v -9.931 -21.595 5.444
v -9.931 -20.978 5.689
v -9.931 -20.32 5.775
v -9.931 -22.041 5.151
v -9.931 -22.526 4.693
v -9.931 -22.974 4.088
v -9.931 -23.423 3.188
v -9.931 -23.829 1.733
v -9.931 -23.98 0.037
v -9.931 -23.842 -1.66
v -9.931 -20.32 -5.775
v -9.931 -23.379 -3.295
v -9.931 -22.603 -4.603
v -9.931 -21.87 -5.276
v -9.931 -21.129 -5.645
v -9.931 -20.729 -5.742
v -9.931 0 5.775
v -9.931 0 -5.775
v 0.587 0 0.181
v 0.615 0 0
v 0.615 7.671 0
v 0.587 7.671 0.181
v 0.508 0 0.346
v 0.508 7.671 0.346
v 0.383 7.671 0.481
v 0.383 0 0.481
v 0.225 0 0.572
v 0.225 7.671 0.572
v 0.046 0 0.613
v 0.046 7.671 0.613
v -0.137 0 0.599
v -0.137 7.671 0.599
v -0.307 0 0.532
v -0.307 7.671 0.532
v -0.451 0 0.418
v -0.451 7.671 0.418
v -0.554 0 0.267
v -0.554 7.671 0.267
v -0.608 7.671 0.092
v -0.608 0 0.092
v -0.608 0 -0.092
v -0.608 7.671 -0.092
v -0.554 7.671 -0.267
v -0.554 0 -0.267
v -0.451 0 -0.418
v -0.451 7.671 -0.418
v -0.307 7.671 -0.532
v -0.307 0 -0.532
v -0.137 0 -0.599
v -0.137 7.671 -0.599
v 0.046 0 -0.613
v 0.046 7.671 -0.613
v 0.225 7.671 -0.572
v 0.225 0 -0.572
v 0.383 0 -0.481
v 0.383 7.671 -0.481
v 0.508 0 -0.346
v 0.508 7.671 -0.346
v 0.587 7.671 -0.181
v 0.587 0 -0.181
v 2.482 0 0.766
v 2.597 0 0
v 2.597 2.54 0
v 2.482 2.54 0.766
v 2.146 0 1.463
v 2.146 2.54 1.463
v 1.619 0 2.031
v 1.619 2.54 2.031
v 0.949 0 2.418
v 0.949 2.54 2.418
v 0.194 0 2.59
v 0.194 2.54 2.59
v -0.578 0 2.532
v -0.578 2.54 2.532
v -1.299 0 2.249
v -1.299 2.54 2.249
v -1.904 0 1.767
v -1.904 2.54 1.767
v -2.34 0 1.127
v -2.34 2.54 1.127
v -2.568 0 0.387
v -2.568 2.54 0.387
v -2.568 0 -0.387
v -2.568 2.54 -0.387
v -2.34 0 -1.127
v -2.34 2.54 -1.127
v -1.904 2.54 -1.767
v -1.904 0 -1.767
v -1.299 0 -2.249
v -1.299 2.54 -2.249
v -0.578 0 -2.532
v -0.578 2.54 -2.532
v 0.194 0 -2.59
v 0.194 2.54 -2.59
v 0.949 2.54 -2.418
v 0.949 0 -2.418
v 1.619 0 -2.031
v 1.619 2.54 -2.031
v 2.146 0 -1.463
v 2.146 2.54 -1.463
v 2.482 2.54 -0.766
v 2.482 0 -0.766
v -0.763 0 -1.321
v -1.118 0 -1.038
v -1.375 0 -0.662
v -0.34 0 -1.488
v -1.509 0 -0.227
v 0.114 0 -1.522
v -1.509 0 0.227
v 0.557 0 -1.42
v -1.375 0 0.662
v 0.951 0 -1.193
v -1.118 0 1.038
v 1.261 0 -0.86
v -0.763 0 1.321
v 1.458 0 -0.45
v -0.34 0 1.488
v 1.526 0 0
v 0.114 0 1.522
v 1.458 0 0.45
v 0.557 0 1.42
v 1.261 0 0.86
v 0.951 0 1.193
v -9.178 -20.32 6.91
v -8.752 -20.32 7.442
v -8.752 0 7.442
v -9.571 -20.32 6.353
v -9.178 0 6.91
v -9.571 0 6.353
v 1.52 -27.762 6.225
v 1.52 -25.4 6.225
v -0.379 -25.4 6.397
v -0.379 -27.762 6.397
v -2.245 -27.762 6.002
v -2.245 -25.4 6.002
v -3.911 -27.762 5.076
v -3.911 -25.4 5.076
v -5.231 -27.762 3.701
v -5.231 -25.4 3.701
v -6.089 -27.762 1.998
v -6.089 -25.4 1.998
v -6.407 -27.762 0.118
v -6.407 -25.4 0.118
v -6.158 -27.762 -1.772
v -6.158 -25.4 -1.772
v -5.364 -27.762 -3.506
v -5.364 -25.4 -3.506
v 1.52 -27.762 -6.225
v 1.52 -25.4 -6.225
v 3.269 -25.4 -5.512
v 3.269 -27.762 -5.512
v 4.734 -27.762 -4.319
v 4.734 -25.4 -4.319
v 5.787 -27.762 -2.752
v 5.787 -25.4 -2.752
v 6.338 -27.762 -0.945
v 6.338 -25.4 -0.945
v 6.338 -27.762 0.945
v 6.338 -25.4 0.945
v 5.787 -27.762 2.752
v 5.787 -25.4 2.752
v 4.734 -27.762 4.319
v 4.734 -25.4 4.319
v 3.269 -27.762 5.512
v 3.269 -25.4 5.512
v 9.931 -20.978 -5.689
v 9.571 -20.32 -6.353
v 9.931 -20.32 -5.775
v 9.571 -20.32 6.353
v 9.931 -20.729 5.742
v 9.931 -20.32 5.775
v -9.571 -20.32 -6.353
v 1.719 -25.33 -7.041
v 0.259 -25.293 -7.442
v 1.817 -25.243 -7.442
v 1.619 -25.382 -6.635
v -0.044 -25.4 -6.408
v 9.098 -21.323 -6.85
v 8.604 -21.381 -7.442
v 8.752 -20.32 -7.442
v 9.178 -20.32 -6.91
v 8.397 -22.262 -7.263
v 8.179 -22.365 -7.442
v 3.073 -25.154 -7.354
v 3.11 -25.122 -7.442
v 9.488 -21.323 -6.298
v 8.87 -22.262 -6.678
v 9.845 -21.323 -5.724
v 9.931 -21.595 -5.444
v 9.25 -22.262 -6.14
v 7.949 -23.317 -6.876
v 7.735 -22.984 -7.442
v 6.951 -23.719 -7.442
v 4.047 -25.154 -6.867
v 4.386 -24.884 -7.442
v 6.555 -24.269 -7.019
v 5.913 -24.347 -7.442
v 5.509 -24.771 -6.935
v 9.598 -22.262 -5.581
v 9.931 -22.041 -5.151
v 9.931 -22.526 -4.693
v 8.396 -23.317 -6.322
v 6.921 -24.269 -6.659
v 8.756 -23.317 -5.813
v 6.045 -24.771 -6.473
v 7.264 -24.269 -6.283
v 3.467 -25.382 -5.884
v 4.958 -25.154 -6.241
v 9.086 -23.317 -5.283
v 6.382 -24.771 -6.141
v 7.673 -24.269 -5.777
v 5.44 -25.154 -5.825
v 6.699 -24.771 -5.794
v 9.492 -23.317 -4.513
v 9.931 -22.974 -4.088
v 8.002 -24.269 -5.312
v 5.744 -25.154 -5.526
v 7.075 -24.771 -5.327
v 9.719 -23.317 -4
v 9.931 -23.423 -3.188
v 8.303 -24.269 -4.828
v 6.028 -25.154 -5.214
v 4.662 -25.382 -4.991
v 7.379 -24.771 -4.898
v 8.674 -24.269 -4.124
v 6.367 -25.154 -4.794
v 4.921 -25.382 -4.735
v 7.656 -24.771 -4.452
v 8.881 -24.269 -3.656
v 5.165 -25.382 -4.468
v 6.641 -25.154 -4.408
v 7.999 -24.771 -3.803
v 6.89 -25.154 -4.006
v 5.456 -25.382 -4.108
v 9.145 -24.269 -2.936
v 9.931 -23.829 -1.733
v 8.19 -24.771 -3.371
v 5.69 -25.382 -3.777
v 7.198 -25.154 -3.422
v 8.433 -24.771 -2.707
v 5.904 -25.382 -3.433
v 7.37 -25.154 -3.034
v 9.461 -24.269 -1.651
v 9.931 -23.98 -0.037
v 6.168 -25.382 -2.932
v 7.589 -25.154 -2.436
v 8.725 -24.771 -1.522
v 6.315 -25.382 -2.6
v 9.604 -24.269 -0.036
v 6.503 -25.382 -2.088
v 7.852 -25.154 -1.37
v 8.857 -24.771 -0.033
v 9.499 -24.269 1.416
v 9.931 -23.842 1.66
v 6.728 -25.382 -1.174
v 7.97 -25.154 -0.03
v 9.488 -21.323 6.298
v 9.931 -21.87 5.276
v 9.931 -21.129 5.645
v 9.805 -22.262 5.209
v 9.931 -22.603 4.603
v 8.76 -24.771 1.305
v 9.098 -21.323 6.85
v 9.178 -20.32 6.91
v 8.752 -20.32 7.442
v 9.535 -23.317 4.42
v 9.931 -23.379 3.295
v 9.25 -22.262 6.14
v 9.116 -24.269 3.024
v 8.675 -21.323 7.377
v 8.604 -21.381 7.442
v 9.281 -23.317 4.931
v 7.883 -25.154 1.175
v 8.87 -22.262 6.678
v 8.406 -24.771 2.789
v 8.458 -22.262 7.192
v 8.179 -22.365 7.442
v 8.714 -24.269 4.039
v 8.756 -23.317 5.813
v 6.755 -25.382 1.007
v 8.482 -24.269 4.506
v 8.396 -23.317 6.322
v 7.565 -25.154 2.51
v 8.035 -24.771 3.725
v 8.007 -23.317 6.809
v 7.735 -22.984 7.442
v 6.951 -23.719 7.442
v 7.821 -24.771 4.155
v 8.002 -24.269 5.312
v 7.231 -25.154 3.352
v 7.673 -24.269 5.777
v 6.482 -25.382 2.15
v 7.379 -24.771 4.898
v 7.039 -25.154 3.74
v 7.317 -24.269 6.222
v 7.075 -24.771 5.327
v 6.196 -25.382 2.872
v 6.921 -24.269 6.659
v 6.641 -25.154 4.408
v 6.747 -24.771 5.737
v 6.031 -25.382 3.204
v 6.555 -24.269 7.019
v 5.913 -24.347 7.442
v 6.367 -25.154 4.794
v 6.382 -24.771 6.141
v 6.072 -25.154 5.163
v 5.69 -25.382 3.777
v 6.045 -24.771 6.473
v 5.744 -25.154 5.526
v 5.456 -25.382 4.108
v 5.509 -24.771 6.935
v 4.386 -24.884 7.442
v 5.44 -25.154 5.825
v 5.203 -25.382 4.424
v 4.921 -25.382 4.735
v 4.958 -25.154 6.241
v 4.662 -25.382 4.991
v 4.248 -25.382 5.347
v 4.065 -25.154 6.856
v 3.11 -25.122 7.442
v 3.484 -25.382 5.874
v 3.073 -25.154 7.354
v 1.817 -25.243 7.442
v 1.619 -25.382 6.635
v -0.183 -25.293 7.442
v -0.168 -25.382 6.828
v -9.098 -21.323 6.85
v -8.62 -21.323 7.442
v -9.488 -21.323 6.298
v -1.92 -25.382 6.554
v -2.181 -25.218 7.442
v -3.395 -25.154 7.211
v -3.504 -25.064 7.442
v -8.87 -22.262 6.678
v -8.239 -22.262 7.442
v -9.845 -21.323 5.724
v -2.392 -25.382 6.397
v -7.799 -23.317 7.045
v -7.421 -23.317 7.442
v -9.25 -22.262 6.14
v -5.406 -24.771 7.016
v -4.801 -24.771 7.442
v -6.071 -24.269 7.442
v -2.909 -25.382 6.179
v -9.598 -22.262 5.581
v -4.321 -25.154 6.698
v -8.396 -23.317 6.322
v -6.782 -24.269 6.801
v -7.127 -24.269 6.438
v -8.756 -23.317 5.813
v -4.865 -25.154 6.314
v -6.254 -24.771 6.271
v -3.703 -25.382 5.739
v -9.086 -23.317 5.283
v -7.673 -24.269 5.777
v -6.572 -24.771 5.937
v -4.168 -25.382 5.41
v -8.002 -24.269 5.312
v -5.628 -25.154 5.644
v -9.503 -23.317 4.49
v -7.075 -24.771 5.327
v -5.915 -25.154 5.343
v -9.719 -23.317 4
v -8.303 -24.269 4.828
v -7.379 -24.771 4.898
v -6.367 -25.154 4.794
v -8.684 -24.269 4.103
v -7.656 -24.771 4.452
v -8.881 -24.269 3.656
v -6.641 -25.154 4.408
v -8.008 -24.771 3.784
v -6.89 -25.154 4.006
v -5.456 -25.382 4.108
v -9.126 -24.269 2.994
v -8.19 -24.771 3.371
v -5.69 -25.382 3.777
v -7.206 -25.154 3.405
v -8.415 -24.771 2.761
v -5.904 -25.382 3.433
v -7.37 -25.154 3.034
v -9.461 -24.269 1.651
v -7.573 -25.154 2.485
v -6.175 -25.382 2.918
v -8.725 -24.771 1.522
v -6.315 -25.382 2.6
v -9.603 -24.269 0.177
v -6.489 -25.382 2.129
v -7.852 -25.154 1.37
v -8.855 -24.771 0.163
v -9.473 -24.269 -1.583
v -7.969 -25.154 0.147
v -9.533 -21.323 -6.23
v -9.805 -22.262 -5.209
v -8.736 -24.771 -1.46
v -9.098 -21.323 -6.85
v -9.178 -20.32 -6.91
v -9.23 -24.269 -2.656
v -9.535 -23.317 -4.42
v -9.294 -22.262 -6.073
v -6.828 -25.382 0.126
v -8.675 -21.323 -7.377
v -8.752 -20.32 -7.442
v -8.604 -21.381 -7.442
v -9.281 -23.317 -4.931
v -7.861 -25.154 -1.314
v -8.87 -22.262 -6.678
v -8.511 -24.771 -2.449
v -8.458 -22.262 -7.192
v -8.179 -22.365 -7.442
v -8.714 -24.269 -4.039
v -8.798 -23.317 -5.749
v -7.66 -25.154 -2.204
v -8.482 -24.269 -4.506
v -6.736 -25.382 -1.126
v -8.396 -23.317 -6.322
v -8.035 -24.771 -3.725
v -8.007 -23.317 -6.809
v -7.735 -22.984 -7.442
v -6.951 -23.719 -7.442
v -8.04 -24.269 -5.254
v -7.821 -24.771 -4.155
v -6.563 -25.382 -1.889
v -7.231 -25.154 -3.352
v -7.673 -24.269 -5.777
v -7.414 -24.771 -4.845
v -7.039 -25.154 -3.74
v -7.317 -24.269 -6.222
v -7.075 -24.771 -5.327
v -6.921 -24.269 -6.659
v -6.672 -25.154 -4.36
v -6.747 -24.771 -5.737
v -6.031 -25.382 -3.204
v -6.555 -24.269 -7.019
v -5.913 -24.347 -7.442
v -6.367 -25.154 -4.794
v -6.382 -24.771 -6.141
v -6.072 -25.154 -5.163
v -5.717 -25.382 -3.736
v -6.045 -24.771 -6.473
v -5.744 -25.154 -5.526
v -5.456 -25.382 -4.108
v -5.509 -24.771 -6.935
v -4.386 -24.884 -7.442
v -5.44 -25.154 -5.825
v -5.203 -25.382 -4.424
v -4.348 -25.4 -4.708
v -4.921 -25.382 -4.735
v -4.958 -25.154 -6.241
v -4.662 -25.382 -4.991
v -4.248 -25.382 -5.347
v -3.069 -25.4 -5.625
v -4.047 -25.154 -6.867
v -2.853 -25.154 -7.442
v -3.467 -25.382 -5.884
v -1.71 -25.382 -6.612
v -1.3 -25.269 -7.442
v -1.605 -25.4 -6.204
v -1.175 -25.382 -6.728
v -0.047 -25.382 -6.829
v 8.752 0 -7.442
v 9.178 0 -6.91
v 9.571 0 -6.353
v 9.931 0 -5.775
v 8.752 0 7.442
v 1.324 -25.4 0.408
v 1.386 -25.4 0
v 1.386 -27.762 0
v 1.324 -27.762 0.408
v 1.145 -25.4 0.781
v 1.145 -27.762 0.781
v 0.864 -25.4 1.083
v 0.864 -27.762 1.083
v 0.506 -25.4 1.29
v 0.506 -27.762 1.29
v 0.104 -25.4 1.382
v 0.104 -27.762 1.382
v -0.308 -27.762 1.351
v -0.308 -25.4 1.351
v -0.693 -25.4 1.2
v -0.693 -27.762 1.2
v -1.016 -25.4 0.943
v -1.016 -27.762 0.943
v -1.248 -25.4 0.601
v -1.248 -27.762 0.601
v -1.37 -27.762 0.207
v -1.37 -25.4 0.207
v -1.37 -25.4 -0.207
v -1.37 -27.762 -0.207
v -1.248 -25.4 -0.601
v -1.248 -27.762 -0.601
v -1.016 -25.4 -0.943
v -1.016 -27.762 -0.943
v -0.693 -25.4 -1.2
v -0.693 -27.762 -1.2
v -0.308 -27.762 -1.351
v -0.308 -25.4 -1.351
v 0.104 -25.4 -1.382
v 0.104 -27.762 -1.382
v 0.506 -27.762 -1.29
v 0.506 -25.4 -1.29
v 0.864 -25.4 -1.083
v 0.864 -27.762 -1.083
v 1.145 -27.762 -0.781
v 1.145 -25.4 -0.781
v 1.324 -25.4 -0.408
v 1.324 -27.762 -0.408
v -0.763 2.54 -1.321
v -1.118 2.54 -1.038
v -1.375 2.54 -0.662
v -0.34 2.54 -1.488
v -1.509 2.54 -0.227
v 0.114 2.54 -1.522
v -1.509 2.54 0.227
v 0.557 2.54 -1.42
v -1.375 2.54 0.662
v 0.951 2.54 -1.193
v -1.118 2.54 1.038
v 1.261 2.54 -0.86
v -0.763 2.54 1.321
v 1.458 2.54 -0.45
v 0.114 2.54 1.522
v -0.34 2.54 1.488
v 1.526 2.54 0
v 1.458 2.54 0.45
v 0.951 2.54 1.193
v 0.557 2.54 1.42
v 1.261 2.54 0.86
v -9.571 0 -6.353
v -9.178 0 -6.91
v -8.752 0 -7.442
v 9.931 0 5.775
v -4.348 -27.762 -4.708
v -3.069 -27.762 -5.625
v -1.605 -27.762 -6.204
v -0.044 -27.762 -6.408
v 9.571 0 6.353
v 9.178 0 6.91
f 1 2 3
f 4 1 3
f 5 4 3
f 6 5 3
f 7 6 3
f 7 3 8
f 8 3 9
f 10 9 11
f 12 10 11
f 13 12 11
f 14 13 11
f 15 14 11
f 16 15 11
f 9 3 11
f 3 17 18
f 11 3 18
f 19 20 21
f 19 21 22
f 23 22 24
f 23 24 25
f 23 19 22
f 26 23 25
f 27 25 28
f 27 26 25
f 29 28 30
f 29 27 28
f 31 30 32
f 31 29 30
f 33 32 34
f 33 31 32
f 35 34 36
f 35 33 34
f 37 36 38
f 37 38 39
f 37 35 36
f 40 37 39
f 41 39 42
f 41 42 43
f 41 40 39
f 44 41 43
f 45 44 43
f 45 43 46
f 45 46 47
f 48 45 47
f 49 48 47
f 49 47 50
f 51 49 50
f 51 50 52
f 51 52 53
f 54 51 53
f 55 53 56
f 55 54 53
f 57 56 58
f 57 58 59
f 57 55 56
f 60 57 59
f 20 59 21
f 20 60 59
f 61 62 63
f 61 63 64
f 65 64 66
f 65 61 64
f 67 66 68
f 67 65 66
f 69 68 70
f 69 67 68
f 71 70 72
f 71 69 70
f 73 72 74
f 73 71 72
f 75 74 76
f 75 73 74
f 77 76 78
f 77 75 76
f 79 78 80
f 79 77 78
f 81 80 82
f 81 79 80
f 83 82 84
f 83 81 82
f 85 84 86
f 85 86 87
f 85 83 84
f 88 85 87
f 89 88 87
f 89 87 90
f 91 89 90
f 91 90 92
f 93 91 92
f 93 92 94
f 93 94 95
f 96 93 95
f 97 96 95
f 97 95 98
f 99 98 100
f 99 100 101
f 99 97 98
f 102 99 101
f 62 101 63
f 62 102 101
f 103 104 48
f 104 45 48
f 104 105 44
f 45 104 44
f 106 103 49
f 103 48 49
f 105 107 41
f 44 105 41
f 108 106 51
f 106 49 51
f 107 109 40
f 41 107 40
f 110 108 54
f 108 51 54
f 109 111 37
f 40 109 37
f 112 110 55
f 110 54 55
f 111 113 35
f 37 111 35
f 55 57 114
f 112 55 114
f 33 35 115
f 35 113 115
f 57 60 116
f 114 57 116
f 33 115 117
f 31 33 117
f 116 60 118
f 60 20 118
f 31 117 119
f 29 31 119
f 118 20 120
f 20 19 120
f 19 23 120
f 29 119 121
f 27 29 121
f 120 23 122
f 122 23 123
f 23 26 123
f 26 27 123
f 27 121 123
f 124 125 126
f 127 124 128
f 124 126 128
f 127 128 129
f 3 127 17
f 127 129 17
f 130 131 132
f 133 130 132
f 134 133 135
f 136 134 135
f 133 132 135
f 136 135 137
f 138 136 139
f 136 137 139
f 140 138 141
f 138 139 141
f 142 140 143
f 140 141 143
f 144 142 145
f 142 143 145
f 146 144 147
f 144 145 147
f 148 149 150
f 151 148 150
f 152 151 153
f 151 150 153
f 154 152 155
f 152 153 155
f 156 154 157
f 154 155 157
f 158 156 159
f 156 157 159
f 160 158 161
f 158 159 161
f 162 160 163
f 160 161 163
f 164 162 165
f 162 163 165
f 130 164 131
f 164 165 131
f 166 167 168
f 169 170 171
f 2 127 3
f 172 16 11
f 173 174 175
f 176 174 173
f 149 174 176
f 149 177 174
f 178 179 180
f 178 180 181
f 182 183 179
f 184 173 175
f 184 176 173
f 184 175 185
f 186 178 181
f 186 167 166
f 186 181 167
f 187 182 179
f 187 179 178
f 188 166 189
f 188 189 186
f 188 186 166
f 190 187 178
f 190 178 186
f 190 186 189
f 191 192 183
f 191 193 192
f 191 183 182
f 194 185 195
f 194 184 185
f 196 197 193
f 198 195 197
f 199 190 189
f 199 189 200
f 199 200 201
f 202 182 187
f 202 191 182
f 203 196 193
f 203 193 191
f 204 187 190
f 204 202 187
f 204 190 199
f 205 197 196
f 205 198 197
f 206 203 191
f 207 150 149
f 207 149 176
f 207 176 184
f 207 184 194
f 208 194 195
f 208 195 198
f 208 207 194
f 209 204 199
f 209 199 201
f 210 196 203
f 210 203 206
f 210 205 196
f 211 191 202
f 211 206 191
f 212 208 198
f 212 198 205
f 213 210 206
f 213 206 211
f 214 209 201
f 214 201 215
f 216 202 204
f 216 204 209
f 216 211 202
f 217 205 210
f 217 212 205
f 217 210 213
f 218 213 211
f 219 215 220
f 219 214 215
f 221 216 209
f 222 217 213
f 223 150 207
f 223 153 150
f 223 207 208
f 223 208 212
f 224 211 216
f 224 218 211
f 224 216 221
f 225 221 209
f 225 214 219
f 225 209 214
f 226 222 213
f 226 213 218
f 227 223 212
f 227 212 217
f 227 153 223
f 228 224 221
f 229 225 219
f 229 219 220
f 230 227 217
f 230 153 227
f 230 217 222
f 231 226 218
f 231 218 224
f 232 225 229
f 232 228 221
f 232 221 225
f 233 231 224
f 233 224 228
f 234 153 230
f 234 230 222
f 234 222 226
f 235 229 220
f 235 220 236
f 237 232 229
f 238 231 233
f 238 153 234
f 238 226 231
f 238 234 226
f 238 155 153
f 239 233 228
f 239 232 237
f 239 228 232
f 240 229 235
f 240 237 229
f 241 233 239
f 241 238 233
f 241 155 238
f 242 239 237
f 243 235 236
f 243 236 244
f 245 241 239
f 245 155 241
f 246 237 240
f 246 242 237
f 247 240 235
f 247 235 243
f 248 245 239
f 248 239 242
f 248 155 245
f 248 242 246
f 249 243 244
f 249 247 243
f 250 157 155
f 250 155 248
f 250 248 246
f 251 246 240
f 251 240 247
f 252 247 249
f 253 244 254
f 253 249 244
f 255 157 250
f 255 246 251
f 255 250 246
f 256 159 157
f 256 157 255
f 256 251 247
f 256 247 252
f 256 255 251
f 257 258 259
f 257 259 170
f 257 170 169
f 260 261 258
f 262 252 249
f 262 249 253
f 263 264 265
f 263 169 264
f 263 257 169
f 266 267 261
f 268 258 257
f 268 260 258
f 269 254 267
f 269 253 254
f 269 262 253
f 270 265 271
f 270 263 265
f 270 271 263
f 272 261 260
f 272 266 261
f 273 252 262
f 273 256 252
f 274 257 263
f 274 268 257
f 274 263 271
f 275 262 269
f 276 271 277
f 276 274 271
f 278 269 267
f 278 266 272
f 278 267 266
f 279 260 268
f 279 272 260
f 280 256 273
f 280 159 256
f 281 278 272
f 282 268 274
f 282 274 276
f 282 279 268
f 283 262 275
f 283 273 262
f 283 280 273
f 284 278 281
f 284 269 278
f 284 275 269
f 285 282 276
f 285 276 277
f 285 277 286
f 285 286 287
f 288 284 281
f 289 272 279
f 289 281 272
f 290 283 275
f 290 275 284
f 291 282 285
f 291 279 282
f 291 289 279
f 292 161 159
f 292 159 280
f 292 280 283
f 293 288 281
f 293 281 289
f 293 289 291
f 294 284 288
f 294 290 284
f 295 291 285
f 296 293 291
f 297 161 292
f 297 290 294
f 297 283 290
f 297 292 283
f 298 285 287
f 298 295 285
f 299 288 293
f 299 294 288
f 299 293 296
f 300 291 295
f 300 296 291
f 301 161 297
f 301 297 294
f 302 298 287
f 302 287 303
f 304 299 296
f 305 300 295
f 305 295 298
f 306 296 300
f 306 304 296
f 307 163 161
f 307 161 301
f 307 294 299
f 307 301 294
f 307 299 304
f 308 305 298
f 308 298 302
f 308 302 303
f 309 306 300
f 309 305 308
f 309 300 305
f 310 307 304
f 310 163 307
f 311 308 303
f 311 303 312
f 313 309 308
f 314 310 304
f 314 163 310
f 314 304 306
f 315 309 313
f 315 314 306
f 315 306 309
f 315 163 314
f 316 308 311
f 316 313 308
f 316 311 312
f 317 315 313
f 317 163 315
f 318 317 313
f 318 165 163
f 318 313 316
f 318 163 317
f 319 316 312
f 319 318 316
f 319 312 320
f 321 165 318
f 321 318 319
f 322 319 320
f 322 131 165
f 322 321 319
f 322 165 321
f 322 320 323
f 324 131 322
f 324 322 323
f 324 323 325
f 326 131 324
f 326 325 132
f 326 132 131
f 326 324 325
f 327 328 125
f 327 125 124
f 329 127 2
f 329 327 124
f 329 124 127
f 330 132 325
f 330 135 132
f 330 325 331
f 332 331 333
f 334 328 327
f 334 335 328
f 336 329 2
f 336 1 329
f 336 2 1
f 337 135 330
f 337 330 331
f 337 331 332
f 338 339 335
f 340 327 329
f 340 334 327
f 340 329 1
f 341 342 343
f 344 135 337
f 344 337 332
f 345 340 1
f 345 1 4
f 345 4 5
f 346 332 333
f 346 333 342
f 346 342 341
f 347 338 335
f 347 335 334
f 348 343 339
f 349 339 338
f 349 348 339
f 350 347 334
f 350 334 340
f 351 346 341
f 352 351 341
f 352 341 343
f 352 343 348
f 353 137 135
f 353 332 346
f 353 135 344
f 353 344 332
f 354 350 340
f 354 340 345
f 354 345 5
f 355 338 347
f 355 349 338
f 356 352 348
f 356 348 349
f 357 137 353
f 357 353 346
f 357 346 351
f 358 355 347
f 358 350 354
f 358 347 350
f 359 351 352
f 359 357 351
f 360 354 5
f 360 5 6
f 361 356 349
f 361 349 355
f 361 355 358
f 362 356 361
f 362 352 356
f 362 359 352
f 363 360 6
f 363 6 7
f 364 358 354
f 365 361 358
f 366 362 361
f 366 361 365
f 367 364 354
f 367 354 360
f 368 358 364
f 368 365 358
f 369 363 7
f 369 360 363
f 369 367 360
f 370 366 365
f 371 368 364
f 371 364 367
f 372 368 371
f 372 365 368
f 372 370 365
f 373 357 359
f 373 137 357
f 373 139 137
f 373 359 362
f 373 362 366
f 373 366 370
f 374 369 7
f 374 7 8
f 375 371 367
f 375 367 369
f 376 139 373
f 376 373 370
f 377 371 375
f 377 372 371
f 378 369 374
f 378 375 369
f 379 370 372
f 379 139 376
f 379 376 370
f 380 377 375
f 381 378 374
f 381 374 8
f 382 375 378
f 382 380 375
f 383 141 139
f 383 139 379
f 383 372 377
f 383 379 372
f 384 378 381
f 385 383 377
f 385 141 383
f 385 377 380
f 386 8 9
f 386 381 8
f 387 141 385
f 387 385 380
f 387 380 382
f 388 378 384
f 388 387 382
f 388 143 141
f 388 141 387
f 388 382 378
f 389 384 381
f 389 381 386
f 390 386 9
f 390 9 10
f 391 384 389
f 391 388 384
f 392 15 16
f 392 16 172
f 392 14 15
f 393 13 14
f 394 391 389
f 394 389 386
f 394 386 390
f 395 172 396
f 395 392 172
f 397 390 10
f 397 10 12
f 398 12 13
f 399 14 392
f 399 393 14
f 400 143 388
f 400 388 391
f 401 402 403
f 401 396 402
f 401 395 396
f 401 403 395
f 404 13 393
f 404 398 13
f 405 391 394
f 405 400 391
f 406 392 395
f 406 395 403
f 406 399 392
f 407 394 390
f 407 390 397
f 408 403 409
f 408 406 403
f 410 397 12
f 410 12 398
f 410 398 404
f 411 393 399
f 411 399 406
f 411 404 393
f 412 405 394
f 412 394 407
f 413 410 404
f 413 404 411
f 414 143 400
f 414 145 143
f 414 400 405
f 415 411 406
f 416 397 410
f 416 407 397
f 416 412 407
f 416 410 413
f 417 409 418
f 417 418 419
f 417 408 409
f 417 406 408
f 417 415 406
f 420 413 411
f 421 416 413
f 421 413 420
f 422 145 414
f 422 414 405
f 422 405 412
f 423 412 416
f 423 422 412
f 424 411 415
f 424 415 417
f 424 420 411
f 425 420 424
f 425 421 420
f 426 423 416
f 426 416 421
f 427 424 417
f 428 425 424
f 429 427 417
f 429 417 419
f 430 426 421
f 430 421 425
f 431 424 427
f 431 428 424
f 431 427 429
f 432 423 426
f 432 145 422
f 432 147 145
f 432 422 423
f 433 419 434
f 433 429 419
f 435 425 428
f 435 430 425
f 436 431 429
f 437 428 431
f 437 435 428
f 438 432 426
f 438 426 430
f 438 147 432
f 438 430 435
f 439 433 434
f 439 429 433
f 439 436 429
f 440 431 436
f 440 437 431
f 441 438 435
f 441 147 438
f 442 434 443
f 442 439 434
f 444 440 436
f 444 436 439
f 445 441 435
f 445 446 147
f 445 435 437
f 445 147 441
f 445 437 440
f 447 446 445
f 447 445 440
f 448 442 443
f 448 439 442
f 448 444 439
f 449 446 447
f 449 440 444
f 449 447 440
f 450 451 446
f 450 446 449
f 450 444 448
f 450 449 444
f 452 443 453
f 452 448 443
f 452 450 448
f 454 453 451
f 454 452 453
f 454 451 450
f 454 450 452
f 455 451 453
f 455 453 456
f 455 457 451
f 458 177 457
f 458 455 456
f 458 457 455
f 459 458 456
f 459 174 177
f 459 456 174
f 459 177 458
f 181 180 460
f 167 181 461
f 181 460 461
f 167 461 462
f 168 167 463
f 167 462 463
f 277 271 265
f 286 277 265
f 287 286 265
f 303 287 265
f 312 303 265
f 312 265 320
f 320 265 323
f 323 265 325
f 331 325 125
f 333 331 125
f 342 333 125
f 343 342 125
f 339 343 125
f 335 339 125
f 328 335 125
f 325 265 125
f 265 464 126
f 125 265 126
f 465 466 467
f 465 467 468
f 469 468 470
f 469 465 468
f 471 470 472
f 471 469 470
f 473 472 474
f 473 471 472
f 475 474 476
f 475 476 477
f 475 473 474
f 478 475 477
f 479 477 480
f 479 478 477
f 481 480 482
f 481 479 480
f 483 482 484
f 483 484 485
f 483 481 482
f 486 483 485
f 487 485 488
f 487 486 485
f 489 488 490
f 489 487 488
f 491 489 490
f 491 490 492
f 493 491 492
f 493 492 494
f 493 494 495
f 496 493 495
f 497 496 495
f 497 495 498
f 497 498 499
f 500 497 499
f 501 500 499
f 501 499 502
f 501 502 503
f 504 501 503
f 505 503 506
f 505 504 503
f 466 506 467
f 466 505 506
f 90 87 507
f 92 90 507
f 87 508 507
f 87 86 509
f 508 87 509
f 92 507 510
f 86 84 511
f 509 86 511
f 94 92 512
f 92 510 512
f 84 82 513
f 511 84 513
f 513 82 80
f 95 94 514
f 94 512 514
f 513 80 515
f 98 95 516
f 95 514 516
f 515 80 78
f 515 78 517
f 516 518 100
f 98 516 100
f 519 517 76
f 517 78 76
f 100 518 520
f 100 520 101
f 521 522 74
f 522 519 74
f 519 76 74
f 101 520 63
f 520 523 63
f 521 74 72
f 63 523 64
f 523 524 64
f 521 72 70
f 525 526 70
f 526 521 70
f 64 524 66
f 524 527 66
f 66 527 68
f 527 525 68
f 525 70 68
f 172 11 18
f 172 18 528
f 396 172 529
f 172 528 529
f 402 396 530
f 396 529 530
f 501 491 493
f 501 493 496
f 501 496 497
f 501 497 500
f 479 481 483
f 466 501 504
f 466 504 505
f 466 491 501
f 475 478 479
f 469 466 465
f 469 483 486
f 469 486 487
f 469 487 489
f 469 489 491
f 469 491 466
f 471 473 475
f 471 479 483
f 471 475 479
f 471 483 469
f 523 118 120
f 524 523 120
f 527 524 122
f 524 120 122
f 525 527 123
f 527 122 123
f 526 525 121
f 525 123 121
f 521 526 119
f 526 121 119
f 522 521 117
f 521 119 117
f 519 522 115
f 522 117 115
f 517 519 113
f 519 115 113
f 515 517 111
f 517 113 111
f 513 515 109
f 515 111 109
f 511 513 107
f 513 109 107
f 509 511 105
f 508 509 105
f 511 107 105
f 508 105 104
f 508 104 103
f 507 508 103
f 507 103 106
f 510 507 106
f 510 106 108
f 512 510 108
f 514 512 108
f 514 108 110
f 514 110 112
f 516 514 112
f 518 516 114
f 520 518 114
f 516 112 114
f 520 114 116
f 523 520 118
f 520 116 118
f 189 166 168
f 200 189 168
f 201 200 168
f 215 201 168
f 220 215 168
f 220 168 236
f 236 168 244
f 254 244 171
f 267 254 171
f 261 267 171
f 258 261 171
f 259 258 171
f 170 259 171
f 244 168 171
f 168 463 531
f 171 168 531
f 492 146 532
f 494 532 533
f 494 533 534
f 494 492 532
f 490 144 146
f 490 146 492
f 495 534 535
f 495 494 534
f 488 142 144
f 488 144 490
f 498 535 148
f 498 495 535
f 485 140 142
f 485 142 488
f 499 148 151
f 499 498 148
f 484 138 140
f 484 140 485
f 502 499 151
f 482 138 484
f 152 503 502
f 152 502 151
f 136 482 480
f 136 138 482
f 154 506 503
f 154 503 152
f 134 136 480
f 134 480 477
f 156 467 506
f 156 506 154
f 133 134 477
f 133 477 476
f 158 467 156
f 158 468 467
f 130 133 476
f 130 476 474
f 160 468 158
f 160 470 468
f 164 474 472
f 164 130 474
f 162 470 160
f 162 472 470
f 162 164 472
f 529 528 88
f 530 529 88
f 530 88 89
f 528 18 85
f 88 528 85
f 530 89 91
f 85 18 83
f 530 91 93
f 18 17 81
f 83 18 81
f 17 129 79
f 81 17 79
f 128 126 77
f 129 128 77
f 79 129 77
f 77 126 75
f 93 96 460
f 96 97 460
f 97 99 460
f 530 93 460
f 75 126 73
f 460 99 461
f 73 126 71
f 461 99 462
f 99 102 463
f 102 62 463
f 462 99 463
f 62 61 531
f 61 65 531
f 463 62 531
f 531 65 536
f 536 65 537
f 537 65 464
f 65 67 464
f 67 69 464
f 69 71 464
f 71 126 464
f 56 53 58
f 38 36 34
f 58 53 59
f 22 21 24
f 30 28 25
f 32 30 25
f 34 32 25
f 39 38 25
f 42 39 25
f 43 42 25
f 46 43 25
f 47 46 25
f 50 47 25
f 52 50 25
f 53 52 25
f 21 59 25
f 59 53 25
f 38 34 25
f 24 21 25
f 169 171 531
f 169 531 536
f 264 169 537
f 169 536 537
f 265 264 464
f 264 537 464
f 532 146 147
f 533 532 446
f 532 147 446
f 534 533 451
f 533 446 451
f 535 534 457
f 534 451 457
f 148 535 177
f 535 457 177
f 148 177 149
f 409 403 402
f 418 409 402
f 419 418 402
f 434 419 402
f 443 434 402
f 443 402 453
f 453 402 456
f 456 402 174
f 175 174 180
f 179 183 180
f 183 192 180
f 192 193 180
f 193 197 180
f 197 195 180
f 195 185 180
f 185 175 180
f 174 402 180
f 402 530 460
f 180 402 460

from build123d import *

# Parameters (mm, degrees)
F1_DEPTH    = 25.4
F2_T2_ANGLE = 136.8806858284
F2_T4_ANGLE = 136.8806858284
F2_T6_ANGLE = 136.8806858284
F2_T8_ANGLE = 136.8806858285
F3_R        = 1.3857299945
F4_DEPTH    = 2.3622
F5_R        = 2.5973758292
F5_R_2      = 1.5258073578
F6_DEPTH    = 2.54
F7_R        = 0.6147751451
F8_DEPTH    = 7.6708


# Not quite as in the source:
# - a fillet or chamfer that OpenCascade refuses, or shapes differently, is made with other operations: its cross-section is extruded or revolved along the edge and cut away or added
# - a feature names something its author has since deleted; it is built from what else it names


with BuildPart() as f1:
    # F0 (on Front) → F1 (new body)
    with BuildSketch(Plane.XZ):
        with BuildLine():
            Line((9.9314, -5.7745984882), (9.9314, 5.7745984882))
            ThreePointArc((9.9314, 5.7745984882), (9.3786903902, 6.6346710713), (8.7517057092, 7.4422))
            Line((8.7517057092, 7.4422), (-8.7517057092, 7.4422))
            ThreePointArc((-8.7517057092, 7.4422), (-9.3786903902, 6.6346710713), (-9.9314, 5.7745984882))
            Line((-9.9314, 5.7745984882), (-9.9314, -5.7745984882))
            ThreePointArc((-9.9314, -5.7745984882), (-9.3786903902, -6.6346710713), (-8.7517057092, -7.4422))
            Line((-8.7517057092, -7.4422), (8.7517057092, -7.4422))
            ThreePointArc((8.7517057092, -7.4422), (9.3786903902, -6.6346710713), (9.9314, -5.7745984882))
        make_face()
    extrude(amount=F1_DEPTH)

    # F2: fillet of radius 5.08 on 4 edges, made by hand

    # F2_s1 → F2_t2 (revolve, cut)
    with BuildSketch(Plane(origin=(0, 0, 0), x_dir=(0, 1, 0), z_dir=(0.9714801037, 0, -0.2371210832))):
        with BuildLine():
            ThreePointArc((-20.32, 11.4881980162), (-23.9121024484, 10.0003004647), (-25.4, 6.4081980162))
            Line((-25.4, 6.4081980162), (-25.4, 11.4881980162))
            Line((-25.4, 11.4881980162), (-20.32, 11.4881980162))
        make_face()
    revolve(axis=Axis((0, -25.4, 0), (0, -1, 0)), revolution_arc=F2_T2_ANGLE, mode=Mode.SUBTRACT)

    # F2_s3 → F2_t4 (revolve, cut)
    with BuildSketch(Plane(origin=(0, 0, 0), x_dir=(0, 1, 0), z_dir=(-0.5470373523, 0, -0.837108198))):
        with BuildLine():
            ThreePointArc((-20.32, 11.4881980162), (-23.9121024484, 10.0003004647), (-25.4, 6.4081980162))
            Line((-25.4, 6.4081980162), (-25.4, 11.4881980162))
            Line((-25.4, 11.4881980162), (-20.32, 11.4881980162))
        make_face()
    revolve(axis=Axis((0, -25.4, 0), (0, -1, 0)), revolution_arc=F2_T4_ANGLE, mode=Mode.SUBTRACT)

    # F2_s5 → F2_t6 (revolve, cut)
    with BuildSketch(Plane(origin=(0, 0, 0), x_dir=(0, 1, 0), z_dir=(0.5470373523, 0, 0.837108198))):
        with BuildLine():
            ThreePointArc((-20.32, 11.4881980162), (-23.9121024484, 10.0003004647), (-25.4, 6.4081980162))
            Line((-25.4, 6.4081980162), (-25.4, 11.4881980162))
            Line((-25.4, 11.4881980162), (-20.32, 11.4881980162))
        make_face()
    revolve(axis=Axis((0, -25.4, 0), (0, -1, 0)), revolution_arc=F2_T6_ANGLE, mode=Mode.SUBTRACT)

    # F2_s7 → F2_t8 (revolve, cut)
    with BuildSketch(Plane(origin=(0, 0, 0), x_dir=(0, 1, 0), z_dir=(-0.9714801037, 0, 0.2371210832))):
        with BuildLine():
            ThreePointArc((-20.32, 11.4881980162), (-23.9121024484, 10.0003004647), (-25.4, 6.4081980162))
            Line((-25.4, 6.4081980162), (-25.4, 11.4881980162))
            Line((-25.4, 11.4881980162), (-20.32, 11.4881980162))
        make_face()
    revolve(axis=Axis((0, -25.4, 0), (0, -1, 0)), revolution_arc=F2_T8_ANGLE, mode=Mode.SUBTRACT)

    # F3 (on face) → F4 (join)
    with BuildSketch(Plane.XZ.offset(25.4)):
        with BuildLine():
            ThreePointArc((1.5195188547, 6.2254368734), (-5.231499759, 3.7008663967), (-5.364355094, -3.5055236756))
            ThreePointArc((-5.364355094, -3.5055236756), (-2.3548191815, -5.9598513771), (1.5195188547, -6.2254368734))
            ThreePointArc((1.5195188547, -6.2254368734), (3.7008663967, -5.231499759), (5.364355094, -3.5055236756))
            ThreePointArc((5.364355094, -3.5055236756), (5.9598513771, 2.3548191815), (1.5195188547, 6.2254368734))
        make_face()
        Circle(F3_R, mode=Mode.SUBTRACT)
    extrude(amount=F4_DEPTH)

    # F5 (on face) → F6 (join)
    with BuildSketch(Plane.XZ):
        Circle(F5_R)
        Circle(F5_R_2, mode=Mode.SUBTRACT)
    extrude(amount=-F6_DEPTH)

    # F7 (on Front) → F8 (join)
    with BuildSketch(Plane.XZ):
        Circle(F7_R)
    extrude(amount=-F8_DEPTH)


solid = f1.part
